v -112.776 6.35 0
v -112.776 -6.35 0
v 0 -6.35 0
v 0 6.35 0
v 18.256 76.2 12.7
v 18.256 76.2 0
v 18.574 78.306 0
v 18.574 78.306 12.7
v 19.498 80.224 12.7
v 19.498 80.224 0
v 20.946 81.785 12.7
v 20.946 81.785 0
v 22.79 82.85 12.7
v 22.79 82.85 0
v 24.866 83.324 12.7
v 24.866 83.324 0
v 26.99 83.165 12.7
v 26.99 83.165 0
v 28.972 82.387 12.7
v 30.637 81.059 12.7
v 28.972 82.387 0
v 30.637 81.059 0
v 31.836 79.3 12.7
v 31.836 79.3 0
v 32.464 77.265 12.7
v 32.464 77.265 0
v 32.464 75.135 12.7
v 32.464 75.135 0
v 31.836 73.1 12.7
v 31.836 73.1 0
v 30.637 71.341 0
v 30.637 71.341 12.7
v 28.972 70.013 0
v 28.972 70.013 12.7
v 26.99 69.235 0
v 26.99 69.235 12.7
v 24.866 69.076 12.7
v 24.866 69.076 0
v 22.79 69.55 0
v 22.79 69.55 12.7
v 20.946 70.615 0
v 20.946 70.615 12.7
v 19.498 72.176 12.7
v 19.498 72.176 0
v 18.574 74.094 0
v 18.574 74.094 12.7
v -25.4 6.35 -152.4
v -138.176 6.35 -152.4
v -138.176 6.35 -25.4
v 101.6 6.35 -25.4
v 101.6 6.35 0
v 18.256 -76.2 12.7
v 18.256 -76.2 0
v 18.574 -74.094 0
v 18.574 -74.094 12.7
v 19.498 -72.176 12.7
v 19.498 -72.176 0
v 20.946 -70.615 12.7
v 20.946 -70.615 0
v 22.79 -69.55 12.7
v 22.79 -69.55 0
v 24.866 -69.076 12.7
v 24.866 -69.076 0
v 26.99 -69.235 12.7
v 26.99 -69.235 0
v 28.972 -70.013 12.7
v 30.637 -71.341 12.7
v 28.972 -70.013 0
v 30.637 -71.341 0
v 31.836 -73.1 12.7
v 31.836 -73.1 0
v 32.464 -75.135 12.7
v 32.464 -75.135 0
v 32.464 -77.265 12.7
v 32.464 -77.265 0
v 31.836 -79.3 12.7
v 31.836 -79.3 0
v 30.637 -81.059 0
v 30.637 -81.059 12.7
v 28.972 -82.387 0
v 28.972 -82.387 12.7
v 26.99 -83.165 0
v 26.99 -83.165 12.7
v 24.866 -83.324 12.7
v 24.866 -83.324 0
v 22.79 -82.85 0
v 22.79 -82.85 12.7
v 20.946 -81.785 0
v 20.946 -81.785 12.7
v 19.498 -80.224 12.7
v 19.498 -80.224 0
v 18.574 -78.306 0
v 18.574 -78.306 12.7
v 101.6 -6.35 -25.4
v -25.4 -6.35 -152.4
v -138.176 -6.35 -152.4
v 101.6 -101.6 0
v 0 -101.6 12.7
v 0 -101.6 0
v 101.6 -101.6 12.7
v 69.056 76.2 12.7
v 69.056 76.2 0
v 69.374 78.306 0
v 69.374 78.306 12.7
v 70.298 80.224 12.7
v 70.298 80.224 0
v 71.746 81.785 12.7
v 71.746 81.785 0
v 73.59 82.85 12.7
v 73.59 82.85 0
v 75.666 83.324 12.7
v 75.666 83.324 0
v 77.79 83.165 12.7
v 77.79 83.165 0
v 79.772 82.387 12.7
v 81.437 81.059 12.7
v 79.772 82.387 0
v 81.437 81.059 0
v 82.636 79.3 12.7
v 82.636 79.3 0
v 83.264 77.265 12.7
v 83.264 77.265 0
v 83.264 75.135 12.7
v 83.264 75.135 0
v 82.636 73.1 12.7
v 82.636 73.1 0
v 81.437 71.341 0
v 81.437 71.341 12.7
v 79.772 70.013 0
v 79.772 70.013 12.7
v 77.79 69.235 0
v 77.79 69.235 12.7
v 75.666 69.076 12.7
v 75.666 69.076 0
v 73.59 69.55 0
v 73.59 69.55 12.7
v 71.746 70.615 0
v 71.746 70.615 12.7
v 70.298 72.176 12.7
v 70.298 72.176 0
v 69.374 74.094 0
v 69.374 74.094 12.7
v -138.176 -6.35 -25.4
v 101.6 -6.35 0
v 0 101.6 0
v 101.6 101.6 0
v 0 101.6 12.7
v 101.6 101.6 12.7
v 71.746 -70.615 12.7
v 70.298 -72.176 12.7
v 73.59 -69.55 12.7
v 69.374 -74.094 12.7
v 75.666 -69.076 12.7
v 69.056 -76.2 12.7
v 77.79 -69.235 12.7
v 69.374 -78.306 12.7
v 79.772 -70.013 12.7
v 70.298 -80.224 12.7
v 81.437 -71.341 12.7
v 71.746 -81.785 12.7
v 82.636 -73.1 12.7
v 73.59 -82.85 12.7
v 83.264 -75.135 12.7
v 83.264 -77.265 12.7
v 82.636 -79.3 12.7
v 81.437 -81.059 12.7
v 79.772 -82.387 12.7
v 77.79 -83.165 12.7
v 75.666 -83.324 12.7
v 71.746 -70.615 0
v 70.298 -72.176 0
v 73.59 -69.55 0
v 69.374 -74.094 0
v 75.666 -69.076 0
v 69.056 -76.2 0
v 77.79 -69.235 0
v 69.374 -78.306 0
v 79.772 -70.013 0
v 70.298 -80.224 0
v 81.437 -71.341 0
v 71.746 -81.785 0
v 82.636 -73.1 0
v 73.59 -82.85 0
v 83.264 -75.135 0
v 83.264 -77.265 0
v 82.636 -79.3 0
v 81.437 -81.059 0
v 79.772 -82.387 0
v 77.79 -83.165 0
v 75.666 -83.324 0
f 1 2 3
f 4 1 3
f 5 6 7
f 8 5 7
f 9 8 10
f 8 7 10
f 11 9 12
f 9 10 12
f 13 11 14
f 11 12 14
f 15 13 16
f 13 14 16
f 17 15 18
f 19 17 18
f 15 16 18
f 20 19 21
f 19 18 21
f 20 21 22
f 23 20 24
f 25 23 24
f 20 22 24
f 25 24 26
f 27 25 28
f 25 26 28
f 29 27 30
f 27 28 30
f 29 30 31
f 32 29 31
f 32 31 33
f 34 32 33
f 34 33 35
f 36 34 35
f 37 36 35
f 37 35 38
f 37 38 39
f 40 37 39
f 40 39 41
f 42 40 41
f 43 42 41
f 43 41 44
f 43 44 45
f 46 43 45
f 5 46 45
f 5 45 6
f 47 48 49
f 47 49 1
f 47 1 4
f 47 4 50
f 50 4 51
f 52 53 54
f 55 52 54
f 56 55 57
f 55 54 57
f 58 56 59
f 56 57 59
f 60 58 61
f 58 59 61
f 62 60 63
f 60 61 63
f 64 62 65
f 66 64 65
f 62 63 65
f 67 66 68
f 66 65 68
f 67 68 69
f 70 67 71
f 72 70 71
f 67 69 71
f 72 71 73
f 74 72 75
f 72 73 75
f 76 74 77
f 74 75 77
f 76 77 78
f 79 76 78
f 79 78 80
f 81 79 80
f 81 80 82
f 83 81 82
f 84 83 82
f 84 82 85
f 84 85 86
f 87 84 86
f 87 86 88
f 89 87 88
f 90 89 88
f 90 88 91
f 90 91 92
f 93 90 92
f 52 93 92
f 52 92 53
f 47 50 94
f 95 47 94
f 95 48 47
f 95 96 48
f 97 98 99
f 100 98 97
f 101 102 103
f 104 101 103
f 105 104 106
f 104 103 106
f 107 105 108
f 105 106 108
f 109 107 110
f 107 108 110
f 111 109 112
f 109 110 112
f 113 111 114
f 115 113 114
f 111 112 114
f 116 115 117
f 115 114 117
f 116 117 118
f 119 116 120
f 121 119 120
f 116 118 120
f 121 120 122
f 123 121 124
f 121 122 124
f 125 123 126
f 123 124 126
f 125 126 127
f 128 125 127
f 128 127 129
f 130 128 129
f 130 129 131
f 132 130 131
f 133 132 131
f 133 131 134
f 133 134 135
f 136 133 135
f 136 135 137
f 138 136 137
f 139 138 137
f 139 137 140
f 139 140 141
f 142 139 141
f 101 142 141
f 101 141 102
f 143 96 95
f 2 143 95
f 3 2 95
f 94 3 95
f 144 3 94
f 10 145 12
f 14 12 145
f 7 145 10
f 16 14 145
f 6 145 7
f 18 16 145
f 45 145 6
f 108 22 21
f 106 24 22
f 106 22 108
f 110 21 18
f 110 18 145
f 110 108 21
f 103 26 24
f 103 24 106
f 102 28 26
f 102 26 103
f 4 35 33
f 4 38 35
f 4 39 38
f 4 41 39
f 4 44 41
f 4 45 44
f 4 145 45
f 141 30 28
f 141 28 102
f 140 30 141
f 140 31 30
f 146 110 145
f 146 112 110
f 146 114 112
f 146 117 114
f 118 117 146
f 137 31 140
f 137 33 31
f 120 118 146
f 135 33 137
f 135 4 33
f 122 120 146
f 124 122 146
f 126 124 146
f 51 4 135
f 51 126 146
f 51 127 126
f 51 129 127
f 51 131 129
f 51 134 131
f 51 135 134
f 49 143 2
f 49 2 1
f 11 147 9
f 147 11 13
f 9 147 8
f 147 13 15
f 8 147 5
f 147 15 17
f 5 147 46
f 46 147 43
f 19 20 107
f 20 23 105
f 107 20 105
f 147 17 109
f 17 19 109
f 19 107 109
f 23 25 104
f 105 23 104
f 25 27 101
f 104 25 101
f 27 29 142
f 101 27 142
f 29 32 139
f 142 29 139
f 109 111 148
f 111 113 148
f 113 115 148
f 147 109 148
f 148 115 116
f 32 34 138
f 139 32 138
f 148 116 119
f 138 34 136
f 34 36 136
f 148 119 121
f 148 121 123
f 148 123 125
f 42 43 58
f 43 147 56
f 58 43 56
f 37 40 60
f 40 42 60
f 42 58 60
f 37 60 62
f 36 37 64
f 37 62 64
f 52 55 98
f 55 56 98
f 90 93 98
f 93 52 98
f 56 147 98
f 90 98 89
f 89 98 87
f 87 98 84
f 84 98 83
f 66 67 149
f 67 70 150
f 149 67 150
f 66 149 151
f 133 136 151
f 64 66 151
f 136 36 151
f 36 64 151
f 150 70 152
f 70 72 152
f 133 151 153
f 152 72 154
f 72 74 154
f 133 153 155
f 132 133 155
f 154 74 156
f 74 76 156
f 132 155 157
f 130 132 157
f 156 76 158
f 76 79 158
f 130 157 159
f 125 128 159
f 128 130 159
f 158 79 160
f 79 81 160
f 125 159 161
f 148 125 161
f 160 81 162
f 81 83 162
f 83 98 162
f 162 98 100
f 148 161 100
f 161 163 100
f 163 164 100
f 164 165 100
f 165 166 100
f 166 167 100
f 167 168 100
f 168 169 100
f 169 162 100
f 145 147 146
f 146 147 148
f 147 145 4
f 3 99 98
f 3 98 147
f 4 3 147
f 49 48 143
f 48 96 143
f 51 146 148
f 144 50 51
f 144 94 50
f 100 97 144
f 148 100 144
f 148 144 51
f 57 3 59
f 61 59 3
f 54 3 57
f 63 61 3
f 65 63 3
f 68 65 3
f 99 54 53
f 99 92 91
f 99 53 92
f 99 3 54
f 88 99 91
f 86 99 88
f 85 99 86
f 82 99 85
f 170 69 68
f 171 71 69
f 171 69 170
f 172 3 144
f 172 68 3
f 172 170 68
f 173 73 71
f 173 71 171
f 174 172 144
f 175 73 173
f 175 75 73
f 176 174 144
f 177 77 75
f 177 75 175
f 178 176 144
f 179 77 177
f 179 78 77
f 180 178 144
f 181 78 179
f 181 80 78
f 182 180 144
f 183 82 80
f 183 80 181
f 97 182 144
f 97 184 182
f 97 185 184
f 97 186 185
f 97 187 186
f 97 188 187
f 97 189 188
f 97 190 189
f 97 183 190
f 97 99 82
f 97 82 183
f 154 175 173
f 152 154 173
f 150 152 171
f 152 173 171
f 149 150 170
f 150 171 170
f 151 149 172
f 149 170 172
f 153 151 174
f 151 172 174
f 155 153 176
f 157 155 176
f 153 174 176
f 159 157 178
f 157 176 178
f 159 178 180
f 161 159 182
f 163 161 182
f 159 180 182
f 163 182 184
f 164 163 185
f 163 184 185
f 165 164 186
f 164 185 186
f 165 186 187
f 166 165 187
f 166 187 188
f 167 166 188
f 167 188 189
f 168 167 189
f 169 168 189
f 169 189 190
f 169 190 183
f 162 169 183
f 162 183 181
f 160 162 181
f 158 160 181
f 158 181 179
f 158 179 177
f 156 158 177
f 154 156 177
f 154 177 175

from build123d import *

# Parameters (mm, degrees)
F0_W     = 101.6
F0_H     = 12.7
F1_DEPTH = 101.6
F3_D     = 14.2875
F4_W     = 239.776
F4_H     = 152.4
F5_DEPTH = 6.35
F6_SIZE  = 25.4
F7_SIZE  = 127


with BuildPart() as f1:
    # F0 (on Front) → F1 (new body, symmetric)
    with BuildSketch(Plane.XZ):
        with Locations((50.8, 6.35)):
            Rectangle(F0_W, F0_H)
    extrude(amount=F1_DEPTH, both=True)

    # F3 (through all)
    with Locations(Plane.XY.offset(12.7)):
        with Locations((25.4, -76.2), (76.2, -76.2), (76.2, 76.2), (25.4, 76.2)):
            Hole(F3_D / 2)

    # F4 (on Front) → F5 (join, symmetric)
    with BuildSketch(Plane.XZ):
        with Locations((-18.288, -76.2)):
            Rectangle(F4_W, F4_H)
    extrude(amount=F5_DEPTH, both=True)

    # F6
    f6_edges = [f1.edges().sort_by_distance(p)[0] for p in [
        (-138.176, 0, 0),
    ]]
    chamfer(f6_edges, length=F6_SIZE)

    # F7
    f7_edges = [f1.edges().sort_by_distance(p)[0] for p in [
        (101.6, 0, -152.4),
    ]]
    chamfer(f7_edges, length=F7_SIZE)


solid = f1.part
